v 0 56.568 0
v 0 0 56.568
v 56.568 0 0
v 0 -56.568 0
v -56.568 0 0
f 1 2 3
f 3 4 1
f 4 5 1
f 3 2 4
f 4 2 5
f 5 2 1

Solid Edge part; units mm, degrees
sketch "Sketch1" plane through (0, 0, 0) normal (0, 0, 1) x (1, 0, 0)
  line L0 (-56.5685, 0) -> (0, -56.5685)
  line L1 (0, -56.5685) -> (56.5685, 0)
  line L2 (56.5685, 0) -> (0, 56.5685)
  line L3 (0, 56.5685) -> (-56.5685, 0)
extrude "Protrusion1" add sketch "Sketch1" along normal up to vertex (56.5685 mm away)
sketch "Sketch2" plane through (0, 0, 0) normal (0.7071, -0.7071, 0) x (0, 0, -1)
  line L0 (-56.5685, 0) -> (0, -40)
extrude "Cutout1" cut sketch "Sketch2" along normal mid plane 80 material side at (-14.171, -14.171, 28.3131)
pattern_circular "Pattern1" count 4 over 360 about axis through (0, 0, 0) along (0, 0, -1) of "Cutout1"
